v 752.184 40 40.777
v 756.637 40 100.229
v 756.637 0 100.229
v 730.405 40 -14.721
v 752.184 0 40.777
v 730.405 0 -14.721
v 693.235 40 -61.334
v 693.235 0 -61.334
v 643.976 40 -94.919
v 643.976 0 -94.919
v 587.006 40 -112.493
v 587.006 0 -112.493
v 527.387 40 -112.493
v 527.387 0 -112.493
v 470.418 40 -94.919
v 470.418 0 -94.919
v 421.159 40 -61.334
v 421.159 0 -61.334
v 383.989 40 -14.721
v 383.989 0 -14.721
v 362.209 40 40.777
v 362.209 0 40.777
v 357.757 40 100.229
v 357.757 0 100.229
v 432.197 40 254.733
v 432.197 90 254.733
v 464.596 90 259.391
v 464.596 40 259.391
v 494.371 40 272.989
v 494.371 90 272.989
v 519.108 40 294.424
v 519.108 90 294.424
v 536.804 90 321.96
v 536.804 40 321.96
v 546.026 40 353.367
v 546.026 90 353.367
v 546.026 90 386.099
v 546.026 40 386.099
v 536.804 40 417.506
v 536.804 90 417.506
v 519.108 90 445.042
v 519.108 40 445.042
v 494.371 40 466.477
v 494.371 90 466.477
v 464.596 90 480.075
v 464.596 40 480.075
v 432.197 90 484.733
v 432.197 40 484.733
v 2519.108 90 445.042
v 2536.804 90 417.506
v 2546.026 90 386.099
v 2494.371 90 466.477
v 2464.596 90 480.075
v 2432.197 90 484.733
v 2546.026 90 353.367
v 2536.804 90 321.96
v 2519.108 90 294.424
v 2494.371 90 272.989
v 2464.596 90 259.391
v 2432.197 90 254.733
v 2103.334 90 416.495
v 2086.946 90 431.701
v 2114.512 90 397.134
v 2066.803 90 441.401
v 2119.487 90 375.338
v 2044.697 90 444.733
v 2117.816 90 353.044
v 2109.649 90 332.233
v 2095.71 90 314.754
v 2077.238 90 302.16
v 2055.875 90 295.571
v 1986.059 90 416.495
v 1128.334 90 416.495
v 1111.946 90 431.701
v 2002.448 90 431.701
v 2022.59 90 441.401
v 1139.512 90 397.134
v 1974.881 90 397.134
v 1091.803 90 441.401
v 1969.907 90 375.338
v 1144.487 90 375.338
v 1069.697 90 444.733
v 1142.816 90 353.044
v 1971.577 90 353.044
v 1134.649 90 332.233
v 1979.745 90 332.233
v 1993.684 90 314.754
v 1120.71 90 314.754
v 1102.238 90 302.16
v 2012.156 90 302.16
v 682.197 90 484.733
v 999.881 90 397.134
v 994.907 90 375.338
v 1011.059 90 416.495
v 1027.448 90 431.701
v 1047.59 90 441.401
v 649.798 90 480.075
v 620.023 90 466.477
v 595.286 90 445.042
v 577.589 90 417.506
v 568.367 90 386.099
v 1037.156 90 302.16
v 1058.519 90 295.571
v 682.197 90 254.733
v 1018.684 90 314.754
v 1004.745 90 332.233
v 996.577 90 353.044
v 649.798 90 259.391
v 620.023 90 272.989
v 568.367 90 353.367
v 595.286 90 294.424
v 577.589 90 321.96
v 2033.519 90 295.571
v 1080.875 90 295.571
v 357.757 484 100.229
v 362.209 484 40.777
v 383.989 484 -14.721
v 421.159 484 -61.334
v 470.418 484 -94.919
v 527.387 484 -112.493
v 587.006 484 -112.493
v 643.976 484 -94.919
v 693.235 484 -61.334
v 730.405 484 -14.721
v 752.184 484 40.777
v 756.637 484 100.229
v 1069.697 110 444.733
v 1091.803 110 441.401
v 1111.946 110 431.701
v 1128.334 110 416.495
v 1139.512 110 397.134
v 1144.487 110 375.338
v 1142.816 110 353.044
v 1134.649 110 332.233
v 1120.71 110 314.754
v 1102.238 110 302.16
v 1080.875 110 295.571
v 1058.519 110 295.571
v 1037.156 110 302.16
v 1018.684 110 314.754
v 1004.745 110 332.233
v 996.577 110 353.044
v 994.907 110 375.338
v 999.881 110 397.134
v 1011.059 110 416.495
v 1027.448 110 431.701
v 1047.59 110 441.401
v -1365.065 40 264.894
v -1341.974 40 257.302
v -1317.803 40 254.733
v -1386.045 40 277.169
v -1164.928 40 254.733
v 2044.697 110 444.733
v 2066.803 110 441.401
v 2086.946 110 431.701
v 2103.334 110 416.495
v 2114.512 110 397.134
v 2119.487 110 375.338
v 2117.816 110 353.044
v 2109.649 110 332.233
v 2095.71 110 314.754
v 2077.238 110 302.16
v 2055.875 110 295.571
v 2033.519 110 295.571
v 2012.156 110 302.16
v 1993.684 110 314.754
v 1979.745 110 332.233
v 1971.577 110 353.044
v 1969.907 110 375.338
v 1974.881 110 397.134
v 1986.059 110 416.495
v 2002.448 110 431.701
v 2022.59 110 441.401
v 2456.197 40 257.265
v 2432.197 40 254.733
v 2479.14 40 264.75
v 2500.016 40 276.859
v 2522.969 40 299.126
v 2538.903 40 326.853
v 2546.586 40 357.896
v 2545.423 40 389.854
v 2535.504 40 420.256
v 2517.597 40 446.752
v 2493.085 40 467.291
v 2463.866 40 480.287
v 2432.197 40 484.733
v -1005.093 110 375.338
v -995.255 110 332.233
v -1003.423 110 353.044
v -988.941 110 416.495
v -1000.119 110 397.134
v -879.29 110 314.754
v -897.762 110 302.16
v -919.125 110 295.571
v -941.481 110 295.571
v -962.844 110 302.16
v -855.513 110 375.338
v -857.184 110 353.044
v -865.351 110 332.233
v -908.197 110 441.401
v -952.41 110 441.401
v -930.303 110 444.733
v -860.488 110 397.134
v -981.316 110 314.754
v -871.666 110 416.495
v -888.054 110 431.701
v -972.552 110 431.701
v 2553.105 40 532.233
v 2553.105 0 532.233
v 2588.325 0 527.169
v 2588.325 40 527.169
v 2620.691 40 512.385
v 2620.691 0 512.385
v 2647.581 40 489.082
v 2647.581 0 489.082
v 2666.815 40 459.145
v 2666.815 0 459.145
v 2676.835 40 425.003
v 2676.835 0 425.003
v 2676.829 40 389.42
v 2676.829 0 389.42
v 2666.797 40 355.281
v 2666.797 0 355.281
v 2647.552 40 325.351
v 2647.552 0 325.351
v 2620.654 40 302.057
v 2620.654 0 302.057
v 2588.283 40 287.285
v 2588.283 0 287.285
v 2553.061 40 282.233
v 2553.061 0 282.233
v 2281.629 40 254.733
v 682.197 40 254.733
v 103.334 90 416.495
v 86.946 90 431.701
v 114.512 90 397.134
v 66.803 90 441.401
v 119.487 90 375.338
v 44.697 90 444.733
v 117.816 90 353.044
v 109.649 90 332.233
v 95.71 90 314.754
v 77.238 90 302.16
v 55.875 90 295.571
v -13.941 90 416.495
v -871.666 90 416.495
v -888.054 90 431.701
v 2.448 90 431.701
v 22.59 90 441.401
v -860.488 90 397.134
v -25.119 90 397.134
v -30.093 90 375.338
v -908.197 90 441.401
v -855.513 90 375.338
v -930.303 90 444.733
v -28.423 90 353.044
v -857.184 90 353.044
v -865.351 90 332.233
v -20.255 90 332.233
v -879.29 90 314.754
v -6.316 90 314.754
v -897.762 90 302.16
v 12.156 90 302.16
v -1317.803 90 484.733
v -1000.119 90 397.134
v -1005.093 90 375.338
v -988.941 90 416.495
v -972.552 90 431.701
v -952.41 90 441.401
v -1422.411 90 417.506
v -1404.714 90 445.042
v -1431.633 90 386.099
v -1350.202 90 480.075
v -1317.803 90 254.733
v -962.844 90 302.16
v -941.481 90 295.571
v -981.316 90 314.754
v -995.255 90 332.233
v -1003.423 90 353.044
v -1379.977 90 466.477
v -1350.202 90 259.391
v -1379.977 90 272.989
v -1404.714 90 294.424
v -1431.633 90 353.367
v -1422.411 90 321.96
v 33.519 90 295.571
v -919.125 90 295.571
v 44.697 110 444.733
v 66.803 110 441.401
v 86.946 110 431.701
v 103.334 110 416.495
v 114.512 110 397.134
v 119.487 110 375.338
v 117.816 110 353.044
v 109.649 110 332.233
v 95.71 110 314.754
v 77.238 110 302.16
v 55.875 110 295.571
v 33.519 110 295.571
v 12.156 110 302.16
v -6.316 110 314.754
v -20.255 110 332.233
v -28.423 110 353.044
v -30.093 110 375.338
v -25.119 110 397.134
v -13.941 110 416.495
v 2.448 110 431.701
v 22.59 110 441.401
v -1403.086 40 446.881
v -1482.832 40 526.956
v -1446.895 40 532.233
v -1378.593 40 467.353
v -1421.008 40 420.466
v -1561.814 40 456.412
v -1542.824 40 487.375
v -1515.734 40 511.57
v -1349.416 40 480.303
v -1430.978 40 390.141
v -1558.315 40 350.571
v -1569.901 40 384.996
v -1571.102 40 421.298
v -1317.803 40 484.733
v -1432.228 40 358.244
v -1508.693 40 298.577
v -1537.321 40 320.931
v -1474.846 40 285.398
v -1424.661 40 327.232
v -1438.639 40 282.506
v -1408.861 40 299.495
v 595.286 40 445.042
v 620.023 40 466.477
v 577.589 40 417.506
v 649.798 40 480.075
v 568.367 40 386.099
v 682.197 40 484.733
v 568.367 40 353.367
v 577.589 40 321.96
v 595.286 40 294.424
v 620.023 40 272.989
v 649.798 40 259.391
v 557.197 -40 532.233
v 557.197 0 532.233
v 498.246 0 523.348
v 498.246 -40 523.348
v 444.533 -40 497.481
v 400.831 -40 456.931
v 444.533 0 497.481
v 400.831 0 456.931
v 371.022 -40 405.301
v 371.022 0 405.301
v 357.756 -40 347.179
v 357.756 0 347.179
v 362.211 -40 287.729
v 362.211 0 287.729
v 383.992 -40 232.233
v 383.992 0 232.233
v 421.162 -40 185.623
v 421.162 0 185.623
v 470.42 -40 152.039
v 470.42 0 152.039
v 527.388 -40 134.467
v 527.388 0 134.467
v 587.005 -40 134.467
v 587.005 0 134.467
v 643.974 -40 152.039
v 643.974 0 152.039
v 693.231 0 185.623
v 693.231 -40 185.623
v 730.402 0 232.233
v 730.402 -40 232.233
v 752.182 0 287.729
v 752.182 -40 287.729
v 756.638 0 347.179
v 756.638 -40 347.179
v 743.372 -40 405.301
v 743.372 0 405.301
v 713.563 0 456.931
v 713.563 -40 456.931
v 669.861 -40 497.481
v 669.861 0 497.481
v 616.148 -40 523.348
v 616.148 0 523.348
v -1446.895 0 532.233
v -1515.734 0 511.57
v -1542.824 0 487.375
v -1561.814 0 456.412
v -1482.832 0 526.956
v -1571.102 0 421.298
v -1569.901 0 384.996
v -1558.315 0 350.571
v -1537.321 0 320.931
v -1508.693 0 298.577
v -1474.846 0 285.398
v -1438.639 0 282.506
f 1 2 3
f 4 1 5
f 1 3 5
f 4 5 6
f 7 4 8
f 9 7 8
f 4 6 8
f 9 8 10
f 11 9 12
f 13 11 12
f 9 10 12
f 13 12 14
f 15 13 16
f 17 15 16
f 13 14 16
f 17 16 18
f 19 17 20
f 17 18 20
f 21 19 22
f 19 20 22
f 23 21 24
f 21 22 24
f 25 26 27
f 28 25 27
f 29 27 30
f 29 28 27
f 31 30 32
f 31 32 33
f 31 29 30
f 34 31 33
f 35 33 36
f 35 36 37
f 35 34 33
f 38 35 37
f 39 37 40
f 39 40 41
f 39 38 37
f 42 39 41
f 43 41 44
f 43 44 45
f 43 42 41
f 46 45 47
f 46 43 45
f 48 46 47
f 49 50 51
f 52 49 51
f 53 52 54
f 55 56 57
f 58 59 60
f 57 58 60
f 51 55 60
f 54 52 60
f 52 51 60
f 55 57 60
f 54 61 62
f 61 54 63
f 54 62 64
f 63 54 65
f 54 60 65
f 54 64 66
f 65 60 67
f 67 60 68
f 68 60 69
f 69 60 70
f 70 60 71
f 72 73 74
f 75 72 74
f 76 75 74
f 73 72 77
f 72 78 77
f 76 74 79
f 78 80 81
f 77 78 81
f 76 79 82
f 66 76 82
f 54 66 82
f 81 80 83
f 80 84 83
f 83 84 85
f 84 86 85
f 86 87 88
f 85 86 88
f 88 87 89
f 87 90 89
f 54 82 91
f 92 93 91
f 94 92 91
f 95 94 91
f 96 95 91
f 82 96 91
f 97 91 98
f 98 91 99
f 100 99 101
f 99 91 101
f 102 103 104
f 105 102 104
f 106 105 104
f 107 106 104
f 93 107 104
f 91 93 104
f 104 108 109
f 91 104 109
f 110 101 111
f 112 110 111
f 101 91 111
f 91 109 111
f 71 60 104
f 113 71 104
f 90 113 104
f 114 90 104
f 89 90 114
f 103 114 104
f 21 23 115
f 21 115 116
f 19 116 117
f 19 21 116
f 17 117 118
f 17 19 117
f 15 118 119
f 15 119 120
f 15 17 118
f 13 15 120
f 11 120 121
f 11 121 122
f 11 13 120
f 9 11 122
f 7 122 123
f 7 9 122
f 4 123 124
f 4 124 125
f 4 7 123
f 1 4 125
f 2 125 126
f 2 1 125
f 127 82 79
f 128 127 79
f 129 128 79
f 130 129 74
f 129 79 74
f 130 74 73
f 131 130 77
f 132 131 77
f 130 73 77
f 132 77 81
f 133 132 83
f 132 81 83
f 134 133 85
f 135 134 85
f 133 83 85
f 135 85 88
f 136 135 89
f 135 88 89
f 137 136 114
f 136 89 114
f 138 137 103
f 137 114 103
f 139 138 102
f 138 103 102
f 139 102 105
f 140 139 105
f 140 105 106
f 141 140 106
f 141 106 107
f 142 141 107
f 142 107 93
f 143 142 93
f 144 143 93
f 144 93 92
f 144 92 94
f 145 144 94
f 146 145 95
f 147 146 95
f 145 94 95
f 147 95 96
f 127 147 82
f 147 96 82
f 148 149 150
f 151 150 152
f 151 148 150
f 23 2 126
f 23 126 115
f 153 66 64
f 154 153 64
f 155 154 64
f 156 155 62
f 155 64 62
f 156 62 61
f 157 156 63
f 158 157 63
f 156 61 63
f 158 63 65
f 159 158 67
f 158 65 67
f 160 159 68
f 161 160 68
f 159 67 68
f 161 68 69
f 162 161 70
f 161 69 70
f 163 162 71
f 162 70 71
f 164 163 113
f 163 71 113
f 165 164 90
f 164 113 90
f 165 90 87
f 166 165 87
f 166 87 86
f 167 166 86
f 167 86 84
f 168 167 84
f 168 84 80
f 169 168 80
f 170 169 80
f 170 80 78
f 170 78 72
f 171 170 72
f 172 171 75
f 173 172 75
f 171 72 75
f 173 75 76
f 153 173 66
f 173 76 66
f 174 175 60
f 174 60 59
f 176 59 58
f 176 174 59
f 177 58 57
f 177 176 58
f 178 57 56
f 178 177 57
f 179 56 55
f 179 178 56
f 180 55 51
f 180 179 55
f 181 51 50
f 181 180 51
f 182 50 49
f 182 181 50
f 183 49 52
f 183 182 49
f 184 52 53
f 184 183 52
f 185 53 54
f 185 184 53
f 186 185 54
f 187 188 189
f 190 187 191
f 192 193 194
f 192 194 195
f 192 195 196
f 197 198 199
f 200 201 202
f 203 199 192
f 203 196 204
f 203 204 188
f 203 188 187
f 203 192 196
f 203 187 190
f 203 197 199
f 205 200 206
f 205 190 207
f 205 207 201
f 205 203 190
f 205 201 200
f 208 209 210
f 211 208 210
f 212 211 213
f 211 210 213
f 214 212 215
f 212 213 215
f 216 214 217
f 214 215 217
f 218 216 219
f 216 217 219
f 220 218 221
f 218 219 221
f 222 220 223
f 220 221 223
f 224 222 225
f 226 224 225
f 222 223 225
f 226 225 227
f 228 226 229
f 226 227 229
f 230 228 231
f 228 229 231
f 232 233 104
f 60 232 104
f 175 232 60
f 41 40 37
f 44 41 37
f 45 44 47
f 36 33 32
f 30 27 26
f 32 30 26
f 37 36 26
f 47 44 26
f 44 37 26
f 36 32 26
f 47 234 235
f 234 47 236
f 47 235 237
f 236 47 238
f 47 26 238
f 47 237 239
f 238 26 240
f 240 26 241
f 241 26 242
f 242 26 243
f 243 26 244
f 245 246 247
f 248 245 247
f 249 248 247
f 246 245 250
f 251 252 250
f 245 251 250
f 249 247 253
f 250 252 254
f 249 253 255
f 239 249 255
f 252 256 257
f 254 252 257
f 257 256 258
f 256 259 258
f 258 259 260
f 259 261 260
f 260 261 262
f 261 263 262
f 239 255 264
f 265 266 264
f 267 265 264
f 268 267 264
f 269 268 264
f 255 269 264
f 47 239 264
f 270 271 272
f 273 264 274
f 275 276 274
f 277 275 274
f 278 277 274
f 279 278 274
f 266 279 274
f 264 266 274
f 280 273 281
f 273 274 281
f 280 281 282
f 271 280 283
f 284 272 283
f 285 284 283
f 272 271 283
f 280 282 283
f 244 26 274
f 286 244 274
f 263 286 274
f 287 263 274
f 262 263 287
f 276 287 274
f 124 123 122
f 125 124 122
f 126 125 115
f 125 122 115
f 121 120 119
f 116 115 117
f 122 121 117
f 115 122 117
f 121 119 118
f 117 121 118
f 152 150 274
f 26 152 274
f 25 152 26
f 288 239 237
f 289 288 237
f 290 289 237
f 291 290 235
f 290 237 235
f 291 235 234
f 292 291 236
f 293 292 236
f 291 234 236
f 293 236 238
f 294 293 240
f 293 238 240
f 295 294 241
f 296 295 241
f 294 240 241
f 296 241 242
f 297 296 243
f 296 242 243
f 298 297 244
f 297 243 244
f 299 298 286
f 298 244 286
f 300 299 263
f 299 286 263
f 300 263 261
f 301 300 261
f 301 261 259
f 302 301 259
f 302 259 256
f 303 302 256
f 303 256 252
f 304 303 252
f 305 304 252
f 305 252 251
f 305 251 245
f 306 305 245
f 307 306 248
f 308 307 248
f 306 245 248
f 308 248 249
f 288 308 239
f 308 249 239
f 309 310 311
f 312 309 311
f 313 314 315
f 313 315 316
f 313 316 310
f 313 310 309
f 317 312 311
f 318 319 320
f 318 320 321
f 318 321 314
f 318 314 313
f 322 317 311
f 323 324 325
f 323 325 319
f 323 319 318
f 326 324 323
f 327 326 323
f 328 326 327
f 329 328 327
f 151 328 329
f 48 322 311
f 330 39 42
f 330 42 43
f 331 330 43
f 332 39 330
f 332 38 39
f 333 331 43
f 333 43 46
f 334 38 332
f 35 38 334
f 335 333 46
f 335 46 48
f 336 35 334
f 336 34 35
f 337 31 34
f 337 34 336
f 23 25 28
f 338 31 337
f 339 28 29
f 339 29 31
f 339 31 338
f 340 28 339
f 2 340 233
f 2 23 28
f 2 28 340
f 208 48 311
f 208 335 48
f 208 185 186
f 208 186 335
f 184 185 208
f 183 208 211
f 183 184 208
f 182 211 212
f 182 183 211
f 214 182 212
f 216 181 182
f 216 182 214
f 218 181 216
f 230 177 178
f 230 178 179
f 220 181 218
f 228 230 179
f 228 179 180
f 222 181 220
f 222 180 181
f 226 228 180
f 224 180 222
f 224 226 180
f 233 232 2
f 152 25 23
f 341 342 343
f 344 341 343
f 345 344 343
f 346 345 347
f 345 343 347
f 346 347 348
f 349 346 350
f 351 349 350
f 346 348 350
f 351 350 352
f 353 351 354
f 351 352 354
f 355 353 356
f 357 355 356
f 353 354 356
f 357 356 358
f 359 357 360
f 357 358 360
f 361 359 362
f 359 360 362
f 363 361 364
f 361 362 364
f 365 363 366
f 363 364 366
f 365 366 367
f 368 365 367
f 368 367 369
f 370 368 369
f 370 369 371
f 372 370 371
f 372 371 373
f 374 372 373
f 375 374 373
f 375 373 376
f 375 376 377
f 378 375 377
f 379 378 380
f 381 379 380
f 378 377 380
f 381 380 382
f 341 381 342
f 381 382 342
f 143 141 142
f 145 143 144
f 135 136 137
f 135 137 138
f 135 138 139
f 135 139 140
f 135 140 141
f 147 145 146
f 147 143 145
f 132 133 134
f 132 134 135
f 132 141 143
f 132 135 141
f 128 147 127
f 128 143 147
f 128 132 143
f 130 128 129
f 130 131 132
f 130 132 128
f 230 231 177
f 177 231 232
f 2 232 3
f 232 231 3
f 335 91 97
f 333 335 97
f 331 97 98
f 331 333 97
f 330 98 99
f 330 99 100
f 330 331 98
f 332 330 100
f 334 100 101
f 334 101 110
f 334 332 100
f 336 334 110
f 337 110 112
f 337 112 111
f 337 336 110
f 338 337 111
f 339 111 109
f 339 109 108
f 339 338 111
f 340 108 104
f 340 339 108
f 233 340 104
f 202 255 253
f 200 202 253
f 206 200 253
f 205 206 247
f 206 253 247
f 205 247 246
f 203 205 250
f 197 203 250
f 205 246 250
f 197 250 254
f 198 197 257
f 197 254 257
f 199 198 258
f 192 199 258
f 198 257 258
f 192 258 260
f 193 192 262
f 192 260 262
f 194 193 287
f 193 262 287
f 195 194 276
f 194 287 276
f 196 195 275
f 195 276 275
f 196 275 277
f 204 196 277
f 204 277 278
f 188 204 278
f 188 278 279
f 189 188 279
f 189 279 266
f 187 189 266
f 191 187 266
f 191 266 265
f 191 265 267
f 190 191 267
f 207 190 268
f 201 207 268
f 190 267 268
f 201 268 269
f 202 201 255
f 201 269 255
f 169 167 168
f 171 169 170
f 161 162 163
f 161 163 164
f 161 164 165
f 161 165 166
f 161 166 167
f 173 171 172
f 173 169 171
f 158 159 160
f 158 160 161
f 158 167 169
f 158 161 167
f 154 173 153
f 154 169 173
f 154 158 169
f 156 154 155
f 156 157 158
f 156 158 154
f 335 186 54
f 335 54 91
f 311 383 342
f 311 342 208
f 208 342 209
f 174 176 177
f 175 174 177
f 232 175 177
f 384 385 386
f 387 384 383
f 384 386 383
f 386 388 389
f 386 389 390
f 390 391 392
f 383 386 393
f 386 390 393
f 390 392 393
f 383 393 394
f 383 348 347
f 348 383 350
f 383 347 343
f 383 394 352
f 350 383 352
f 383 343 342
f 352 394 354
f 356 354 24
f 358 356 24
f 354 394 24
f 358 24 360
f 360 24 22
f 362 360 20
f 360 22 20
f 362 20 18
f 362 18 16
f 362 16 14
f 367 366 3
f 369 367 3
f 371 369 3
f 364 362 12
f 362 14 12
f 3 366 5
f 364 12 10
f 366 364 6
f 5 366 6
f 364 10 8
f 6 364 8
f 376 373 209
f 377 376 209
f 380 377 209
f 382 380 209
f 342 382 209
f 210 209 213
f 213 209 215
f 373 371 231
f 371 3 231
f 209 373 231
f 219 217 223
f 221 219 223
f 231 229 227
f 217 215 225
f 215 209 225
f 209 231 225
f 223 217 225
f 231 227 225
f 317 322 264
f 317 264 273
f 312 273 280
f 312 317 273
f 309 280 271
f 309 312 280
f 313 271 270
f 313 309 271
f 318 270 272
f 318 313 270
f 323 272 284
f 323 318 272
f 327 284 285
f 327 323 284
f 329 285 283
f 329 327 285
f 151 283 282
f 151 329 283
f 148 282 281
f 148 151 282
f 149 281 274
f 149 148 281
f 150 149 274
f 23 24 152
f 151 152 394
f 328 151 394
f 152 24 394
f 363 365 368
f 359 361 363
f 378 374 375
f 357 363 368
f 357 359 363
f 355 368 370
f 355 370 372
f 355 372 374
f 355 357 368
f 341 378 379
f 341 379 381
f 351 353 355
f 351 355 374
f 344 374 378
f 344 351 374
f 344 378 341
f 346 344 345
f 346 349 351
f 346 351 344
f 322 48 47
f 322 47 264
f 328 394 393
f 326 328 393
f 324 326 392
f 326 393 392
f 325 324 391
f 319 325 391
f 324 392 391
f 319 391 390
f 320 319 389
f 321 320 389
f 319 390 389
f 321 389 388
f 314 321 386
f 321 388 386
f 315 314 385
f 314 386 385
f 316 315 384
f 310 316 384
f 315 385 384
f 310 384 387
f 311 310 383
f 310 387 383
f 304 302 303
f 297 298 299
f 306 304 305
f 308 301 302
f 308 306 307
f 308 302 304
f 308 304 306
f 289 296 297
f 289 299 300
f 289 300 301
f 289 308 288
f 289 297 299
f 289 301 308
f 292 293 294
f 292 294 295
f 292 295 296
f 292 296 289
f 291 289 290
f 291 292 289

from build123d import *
from build123d.topology import SkipClean

# Parameters (mm, degrees)
BOSS_EXTRUDE1_DEPTH = 40
BOSS_EXTRUDE2_DEPTH = 50
SKETCH3_R           = 75
BOSS_EXTRUDE3_DEPTH = 20
SKETCH4_R           = 200
BOSS_EXTRUDE4_DEPTH = 40
BOSS_EXTRUDE5_DEPTH = 444


with BuildPart() as part:
    # Sketch1 → Boss-Extrude1 (new body)
    with BuildSketch(Plane(origin=(0, 0, 0), x_dir=(1, 0, 0), z_dir=(0, 1, 0))):
        with BuildLine():
            Line((-1446.895354921, -532.23311623), (2553.104645079, -532.23311623))
            ThreePointArc((2553.104645079, -532.23311623), (2678.104643133, -407.21106021), (2553.060533039, -282.233124013))
            Line((2553.060533039, -282.233124013), (756.636813569, -100.229265467))
            ThreePointArc((756.636813569, -100.229265467), (557.196813569, 114.72688377), (357.756813569, -100.229265467))
            Line((357.756813569, -100.229265467), (-1438.639231703, -282.506068524))
            ThreePointArc((-1438.639231703, -282.506068524), (-1571.827098211, -403.102799246), (-1446.895354921, -532.23311623))
        make_face()
    extrude(amount=BOSS_EXTRUDE1_DEPTH)

    # Sketch2 → Boss-Extrude2 (add)
    with BuildSketch(Plane(origin=(0, 40, 0), x_dir=(1, 0, 0), z_dir=(0, 1, 0))):
        with BuildLine():
            Line((682.196813569, -254.73311623), (2432.196813569, -254.73311623))
            ThreePointArc((2432.196813569, -254.73311623), (2547.196813569, -369.73311623), (2432.196813569, -484.73311623))
            Line((2432.196813569, -484.73311623), (682.196813569, -484.73311623))
            ThreePointArc((682.196813569, -484.73311623), (567.196813569, -369.73311623), (682.196813569, -254.73311623))
        make_face()
        with BuildLine():
            Line((432.196813569, -484.73311623), (-1317.803186431, -484.73311623))
            ThreePointArc((-1317.803186431, -484.73311623), (-1432.803186431, -369.73311623), (-1317.803186431, -254.73311623))
            Line((-1317.803186431, -254.73311623), (432.196813569, -254.73311623))
            ThreePointArc((432.196813569, -254.73311623), (547.196813569, -369.73311623), (432.196813569, -484.73311623))
        make_face()
    extrude(amount=BOSS_EXTRUDE2_DEPTH)

    # Sketch3 → Boss-Extrude3 (add)
    with BuildSketch(Plane(origin=(0, 90, 0), x_dir=(1, 0, 0), z_dir=(0, 1, 0))):
        with Locations(Location((-930.303186431, -369.73311623, 0), (0, 0, 270))):
            Circle(SKETCH3_R)
        with Locations(Location((44.696813569, -369.73311623, 0), (0, 0, 270))):
            Circle(SKETCH3_R)
        with Locations(Location((1069.696813569, -369.73311623, 0), (0, 0, 270))):
            Circle(SKETCH3_R)
        with Locations(Location((2044.696813569, -369.73311623, 0), (0, 0, 270))):
            Circle(SKETCH3_R)
    extrude(amount=BOSS_EXTRUDE3_DEPTH)

    # Sketch4 → Boss-Extrude4 (add)
    with BuildSketch(Plane(origin=(0, 0, 0), x_dir=(-1, 0, 0), z_dir=(0, -1, 0))):
        with Locations(Location((-557.196813569, -332.23311623, 0), (0, 0, 270))):
            Circle(SKETCH4_R)
    extrude(amount=BOSS_EXTRUDE4_DEPTH)

    # Sketch5 → Boss-Extrude5 (add)
    with SkipClean():  # the faces are left unmerged after this step: merging them gives an invalid solid
        with BuildSketch(Plane(origin=(0, 40, 0), x_dir=(1, 0, 0), z_dir=(0, 1, 0))):
            with BuildLine():
                Line((756.636813569, -100.229265467), (357.756813569, -100.229265467))
                ThreePointArc((357.756813569, -100.229265467), (557.196813569, 114.72688377), (756.636813569, -100.229265467))
            make_face()
        extrude(amount=BOSS_EXTRUDE5_DEPTH)


solid = part.part
